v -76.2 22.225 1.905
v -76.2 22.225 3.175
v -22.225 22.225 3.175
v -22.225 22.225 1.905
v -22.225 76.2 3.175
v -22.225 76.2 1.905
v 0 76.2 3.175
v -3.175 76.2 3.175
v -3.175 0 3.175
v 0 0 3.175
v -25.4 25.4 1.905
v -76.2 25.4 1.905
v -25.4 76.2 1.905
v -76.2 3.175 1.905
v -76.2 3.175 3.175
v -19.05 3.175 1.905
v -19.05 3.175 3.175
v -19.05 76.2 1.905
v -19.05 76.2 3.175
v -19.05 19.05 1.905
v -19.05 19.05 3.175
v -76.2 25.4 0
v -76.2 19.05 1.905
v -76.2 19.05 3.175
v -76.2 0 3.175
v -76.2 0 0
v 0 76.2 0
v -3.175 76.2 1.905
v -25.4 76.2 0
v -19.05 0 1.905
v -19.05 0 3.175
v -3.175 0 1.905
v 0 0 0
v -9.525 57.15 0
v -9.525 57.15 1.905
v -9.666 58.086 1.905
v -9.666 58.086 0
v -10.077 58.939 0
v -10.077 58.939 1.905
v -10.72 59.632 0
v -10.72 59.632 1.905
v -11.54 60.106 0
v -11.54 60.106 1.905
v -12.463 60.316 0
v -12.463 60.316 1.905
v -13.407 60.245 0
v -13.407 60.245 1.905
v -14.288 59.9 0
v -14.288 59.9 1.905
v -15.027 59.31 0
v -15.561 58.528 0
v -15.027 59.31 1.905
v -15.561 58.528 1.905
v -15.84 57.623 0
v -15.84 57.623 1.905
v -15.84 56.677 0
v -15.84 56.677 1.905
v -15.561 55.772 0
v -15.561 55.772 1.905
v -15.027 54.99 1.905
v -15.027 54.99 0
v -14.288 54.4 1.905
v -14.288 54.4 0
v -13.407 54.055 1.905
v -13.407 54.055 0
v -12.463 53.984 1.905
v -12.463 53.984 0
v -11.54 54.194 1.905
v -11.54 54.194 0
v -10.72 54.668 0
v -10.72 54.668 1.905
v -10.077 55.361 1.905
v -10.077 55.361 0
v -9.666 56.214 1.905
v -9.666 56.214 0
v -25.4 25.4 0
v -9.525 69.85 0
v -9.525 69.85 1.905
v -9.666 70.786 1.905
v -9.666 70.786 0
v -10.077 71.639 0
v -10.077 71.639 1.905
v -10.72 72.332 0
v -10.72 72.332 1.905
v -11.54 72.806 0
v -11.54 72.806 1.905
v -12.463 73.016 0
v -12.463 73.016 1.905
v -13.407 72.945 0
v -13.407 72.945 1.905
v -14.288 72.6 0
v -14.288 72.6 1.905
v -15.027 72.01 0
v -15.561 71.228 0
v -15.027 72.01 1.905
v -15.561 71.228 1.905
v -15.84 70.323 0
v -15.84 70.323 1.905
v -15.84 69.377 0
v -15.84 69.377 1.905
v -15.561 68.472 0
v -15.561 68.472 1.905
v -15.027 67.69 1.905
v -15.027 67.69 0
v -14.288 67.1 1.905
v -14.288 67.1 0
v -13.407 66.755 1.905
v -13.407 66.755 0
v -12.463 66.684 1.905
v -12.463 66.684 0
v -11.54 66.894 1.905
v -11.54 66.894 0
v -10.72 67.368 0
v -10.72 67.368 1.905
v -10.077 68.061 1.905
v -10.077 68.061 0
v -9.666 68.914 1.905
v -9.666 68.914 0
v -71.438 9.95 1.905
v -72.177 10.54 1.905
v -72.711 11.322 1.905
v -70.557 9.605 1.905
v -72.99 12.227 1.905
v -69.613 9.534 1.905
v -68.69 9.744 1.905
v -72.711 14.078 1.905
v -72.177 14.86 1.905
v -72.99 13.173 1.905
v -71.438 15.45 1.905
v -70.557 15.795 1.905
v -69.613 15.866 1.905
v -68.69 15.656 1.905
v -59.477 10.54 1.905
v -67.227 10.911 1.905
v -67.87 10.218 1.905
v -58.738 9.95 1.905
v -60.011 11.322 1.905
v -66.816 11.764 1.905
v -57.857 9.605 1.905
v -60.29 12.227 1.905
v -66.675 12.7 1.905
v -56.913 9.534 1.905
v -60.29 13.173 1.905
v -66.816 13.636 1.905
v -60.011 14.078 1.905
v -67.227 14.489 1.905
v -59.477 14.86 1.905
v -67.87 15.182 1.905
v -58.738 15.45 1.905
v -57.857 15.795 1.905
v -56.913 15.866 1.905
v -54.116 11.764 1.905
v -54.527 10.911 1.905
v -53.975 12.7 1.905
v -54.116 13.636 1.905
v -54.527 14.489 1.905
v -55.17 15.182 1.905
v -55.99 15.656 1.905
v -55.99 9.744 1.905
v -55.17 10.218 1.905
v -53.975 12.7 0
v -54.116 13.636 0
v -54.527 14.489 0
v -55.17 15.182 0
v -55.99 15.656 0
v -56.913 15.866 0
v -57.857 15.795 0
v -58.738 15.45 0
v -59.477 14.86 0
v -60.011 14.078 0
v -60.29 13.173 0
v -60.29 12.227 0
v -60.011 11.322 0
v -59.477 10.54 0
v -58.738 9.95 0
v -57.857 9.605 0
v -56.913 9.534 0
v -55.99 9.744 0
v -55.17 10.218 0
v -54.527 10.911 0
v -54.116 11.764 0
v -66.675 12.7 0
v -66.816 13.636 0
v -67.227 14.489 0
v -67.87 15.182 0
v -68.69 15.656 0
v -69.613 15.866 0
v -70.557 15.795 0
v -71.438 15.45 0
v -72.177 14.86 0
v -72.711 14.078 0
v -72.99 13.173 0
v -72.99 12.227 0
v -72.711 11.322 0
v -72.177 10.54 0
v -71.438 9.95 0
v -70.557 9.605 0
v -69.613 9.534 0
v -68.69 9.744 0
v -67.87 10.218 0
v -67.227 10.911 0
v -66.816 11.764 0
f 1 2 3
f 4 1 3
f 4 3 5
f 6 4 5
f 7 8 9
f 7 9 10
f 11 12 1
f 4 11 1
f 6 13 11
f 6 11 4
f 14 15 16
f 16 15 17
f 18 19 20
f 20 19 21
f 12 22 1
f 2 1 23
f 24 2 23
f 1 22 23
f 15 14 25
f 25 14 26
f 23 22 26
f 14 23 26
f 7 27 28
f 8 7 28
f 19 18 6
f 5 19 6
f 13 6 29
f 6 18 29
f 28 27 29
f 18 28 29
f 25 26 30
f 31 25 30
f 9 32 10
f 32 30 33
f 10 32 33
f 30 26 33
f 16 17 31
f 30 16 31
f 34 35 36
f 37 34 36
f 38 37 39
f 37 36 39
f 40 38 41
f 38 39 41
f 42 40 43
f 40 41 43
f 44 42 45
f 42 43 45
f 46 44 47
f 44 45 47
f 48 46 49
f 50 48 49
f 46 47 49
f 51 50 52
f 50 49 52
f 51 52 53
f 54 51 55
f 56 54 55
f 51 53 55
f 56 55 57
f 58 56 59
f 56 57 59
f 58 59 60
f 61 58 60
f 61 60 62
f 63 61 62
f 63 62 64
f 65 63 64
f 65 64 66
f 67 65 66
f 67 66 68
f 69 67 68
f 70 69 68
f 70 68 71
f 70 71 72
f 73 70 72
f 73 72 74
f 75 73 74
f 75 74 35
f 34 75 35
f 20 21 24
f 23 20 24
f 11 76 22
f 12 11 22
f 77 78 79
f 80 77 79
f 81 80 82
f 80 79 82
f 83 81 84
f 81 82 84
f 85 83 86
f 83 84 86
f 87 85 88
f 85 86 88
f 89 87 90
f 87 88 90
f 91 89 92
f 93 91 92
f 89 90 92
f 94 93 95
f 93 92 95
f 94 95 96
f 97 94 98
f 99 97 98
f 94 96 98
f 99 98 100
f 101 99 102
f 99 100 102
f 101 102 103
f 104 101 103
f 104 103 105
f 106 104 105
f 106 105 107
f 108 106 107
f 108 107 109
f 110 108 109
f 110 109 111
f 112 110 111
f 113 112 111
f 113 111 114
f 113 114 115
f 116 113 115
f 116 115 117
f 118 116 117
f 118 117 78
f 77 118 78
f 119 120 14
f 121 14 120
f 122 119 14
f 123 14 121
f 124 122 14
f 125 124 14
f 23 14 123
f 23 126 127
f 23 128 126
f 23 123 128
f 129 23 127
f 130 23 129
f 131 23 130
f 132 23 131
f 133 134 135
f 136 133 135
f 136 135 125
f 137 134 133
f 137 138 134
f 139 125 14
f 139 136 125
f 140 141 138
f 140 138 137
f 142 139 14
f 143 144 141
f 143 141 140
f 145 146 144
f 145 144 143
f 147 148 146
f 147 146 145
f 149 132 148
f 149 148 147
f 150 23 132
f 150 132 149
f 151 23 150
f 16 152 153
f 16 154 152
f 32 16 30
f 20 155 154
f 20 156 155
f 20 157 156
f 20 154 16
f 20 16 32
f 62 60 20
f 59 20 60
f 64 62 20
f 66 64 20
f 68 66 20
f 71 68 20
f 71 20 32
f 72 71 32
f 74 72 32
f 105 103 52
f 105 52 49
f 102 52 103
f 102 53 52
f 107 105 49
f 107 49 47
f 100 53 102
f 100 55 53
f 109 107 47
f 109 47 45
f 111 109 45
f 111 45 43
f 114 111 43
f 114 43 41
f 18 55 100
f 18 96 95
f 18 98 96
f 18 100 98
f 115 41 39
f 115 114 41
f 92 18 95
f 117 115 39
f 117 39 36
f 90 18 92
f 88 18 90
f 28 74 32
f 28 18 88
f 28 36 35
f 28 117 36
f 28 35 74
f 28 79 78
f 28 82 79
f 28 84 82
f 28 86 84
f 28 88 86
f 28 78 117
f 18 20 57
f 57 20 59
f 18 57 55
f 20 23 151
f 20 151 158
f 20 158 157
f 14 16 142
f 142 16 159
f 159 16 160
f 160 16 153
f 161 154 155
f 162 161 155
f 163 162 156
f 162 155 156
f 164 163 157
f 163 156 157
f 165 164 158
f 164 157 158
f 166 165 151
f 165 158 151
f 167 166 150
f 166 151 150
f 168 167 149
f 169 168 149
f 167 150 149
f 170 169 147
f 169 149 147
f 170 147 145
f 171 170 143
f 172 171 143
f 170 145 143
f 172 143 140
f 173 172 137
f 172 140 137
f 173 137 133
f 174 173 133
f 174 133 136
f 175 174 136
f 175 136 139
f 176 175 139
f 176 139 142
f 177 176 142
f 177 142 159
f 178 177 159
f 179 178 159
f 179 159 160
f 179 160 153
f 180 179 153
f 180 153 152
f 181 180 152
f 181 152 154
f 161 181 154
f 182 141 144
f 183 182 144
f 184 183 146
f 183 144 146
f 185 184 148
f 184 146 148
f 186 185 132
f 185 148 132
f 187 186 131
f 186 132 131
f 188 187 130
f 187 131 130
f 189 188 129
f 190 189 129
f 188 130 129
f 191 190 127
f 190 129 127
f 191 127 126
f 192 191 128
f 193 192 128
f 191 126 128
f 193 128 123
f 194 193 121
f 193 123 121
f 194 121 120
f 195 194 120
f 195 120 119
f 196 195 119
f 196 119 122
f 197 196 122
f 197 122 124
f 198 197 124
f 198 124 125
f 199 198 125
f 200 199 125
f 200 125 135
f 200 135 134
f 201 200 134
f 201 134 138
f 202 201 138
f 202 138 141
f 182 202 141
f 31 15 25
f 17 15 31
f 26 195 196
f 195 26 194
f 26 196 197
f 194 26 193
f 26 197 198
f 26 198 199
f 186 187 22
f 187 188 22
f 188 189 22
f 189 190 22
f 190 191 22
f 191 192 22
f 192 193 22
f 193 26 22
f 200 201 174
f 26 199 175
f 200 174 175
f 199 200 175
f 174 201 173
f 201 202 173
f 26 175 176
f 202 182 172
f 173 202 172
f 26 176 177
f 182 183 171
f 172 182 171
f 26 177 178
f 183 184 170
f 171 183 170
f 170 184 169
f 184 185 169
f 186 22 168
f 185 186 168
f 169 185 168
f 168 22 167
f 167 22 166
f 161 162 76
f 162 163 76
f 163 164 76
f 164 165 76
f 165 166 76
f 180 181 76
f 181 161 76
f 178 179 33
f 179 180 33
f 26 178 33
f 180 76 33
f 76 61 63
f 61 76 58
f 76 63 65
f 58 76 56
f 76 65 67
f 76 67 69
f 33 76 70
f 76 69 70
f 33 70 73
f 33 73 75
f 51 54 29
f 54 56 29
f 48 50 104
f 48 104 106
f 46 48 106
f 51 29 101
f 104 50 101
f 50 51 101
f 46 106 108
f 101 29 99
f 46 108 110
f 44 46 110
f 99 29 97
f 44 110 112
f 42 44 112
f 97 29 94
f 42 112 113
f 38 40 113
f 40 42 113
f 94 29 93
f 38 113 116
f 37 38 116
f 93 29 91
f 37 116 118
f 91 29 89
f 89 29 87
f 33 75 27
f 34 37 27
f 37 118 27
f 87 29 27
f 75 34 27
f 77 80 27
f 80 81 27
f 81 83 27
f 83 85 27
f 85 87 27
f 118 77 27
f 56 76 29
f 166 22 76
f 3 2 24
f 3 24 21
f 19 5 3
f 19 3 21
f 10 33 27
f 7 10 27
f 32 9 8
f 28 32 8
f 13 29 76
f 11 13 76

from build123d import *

# Parameters (mm, degrees)
F1_DEPTH = 3.175
F3_DEPTH = 1.27
F4_R     = 3.175
F5_DEPTH = 25.4


with BuildPart() as f1:
    # F0 (on Top) → F1 (new body)
    with BuildSketch(Plane.XY):
        Polygon((-76.2, 0), (0, 0), (0, 76.2), (-25.4, 76.2), (-25.4, 25.4), (-76.2, 25.4), align=None)
    extrude(amount=F1_DEPTH)

    # F2 (on face) → F3 (cut)
    with BuildSketch(Plane.XY.offset(3.175)):
        Polygon((-22.225, 76.2), (-25.4, 76.2), (-25.4, 25.4), (-76.2, 25.4), (-76.2, 22.225), (-25.4, 22.225), (-22.225, 22.225), (-22.225, 25.4), align=None)
        Polygon((-3.175, 76.2), (-19.05, 76.2), (-19.05, 19.05), (-76.2, 19.05), (-76.2, 3.175), (-19.05, 3.175), (-19.05, 0), (-3.175, 0), align=None)
    extrude(amount=-F3_DEPTH, mode=Mode.SUBTRACT)

    # F4 (on face) → F5 (cut)
    with BuildSketch(Plane.XY.offset(3.175)):
        with Locations((-12.7, 69.85)):
            Circle(F4_R)
        with Locations((-12.7, 57.15)):
            Circle(F4_R)
        with Locations((-57.15, 12.7)):
            Circle(F4_R)
        with Locations((-69.85, 12.7)):
            Circle(F4_R)
    extrude(amount=-F5_DEPTH, mode=Mode.SUBTRACT)


solid = f1.part
